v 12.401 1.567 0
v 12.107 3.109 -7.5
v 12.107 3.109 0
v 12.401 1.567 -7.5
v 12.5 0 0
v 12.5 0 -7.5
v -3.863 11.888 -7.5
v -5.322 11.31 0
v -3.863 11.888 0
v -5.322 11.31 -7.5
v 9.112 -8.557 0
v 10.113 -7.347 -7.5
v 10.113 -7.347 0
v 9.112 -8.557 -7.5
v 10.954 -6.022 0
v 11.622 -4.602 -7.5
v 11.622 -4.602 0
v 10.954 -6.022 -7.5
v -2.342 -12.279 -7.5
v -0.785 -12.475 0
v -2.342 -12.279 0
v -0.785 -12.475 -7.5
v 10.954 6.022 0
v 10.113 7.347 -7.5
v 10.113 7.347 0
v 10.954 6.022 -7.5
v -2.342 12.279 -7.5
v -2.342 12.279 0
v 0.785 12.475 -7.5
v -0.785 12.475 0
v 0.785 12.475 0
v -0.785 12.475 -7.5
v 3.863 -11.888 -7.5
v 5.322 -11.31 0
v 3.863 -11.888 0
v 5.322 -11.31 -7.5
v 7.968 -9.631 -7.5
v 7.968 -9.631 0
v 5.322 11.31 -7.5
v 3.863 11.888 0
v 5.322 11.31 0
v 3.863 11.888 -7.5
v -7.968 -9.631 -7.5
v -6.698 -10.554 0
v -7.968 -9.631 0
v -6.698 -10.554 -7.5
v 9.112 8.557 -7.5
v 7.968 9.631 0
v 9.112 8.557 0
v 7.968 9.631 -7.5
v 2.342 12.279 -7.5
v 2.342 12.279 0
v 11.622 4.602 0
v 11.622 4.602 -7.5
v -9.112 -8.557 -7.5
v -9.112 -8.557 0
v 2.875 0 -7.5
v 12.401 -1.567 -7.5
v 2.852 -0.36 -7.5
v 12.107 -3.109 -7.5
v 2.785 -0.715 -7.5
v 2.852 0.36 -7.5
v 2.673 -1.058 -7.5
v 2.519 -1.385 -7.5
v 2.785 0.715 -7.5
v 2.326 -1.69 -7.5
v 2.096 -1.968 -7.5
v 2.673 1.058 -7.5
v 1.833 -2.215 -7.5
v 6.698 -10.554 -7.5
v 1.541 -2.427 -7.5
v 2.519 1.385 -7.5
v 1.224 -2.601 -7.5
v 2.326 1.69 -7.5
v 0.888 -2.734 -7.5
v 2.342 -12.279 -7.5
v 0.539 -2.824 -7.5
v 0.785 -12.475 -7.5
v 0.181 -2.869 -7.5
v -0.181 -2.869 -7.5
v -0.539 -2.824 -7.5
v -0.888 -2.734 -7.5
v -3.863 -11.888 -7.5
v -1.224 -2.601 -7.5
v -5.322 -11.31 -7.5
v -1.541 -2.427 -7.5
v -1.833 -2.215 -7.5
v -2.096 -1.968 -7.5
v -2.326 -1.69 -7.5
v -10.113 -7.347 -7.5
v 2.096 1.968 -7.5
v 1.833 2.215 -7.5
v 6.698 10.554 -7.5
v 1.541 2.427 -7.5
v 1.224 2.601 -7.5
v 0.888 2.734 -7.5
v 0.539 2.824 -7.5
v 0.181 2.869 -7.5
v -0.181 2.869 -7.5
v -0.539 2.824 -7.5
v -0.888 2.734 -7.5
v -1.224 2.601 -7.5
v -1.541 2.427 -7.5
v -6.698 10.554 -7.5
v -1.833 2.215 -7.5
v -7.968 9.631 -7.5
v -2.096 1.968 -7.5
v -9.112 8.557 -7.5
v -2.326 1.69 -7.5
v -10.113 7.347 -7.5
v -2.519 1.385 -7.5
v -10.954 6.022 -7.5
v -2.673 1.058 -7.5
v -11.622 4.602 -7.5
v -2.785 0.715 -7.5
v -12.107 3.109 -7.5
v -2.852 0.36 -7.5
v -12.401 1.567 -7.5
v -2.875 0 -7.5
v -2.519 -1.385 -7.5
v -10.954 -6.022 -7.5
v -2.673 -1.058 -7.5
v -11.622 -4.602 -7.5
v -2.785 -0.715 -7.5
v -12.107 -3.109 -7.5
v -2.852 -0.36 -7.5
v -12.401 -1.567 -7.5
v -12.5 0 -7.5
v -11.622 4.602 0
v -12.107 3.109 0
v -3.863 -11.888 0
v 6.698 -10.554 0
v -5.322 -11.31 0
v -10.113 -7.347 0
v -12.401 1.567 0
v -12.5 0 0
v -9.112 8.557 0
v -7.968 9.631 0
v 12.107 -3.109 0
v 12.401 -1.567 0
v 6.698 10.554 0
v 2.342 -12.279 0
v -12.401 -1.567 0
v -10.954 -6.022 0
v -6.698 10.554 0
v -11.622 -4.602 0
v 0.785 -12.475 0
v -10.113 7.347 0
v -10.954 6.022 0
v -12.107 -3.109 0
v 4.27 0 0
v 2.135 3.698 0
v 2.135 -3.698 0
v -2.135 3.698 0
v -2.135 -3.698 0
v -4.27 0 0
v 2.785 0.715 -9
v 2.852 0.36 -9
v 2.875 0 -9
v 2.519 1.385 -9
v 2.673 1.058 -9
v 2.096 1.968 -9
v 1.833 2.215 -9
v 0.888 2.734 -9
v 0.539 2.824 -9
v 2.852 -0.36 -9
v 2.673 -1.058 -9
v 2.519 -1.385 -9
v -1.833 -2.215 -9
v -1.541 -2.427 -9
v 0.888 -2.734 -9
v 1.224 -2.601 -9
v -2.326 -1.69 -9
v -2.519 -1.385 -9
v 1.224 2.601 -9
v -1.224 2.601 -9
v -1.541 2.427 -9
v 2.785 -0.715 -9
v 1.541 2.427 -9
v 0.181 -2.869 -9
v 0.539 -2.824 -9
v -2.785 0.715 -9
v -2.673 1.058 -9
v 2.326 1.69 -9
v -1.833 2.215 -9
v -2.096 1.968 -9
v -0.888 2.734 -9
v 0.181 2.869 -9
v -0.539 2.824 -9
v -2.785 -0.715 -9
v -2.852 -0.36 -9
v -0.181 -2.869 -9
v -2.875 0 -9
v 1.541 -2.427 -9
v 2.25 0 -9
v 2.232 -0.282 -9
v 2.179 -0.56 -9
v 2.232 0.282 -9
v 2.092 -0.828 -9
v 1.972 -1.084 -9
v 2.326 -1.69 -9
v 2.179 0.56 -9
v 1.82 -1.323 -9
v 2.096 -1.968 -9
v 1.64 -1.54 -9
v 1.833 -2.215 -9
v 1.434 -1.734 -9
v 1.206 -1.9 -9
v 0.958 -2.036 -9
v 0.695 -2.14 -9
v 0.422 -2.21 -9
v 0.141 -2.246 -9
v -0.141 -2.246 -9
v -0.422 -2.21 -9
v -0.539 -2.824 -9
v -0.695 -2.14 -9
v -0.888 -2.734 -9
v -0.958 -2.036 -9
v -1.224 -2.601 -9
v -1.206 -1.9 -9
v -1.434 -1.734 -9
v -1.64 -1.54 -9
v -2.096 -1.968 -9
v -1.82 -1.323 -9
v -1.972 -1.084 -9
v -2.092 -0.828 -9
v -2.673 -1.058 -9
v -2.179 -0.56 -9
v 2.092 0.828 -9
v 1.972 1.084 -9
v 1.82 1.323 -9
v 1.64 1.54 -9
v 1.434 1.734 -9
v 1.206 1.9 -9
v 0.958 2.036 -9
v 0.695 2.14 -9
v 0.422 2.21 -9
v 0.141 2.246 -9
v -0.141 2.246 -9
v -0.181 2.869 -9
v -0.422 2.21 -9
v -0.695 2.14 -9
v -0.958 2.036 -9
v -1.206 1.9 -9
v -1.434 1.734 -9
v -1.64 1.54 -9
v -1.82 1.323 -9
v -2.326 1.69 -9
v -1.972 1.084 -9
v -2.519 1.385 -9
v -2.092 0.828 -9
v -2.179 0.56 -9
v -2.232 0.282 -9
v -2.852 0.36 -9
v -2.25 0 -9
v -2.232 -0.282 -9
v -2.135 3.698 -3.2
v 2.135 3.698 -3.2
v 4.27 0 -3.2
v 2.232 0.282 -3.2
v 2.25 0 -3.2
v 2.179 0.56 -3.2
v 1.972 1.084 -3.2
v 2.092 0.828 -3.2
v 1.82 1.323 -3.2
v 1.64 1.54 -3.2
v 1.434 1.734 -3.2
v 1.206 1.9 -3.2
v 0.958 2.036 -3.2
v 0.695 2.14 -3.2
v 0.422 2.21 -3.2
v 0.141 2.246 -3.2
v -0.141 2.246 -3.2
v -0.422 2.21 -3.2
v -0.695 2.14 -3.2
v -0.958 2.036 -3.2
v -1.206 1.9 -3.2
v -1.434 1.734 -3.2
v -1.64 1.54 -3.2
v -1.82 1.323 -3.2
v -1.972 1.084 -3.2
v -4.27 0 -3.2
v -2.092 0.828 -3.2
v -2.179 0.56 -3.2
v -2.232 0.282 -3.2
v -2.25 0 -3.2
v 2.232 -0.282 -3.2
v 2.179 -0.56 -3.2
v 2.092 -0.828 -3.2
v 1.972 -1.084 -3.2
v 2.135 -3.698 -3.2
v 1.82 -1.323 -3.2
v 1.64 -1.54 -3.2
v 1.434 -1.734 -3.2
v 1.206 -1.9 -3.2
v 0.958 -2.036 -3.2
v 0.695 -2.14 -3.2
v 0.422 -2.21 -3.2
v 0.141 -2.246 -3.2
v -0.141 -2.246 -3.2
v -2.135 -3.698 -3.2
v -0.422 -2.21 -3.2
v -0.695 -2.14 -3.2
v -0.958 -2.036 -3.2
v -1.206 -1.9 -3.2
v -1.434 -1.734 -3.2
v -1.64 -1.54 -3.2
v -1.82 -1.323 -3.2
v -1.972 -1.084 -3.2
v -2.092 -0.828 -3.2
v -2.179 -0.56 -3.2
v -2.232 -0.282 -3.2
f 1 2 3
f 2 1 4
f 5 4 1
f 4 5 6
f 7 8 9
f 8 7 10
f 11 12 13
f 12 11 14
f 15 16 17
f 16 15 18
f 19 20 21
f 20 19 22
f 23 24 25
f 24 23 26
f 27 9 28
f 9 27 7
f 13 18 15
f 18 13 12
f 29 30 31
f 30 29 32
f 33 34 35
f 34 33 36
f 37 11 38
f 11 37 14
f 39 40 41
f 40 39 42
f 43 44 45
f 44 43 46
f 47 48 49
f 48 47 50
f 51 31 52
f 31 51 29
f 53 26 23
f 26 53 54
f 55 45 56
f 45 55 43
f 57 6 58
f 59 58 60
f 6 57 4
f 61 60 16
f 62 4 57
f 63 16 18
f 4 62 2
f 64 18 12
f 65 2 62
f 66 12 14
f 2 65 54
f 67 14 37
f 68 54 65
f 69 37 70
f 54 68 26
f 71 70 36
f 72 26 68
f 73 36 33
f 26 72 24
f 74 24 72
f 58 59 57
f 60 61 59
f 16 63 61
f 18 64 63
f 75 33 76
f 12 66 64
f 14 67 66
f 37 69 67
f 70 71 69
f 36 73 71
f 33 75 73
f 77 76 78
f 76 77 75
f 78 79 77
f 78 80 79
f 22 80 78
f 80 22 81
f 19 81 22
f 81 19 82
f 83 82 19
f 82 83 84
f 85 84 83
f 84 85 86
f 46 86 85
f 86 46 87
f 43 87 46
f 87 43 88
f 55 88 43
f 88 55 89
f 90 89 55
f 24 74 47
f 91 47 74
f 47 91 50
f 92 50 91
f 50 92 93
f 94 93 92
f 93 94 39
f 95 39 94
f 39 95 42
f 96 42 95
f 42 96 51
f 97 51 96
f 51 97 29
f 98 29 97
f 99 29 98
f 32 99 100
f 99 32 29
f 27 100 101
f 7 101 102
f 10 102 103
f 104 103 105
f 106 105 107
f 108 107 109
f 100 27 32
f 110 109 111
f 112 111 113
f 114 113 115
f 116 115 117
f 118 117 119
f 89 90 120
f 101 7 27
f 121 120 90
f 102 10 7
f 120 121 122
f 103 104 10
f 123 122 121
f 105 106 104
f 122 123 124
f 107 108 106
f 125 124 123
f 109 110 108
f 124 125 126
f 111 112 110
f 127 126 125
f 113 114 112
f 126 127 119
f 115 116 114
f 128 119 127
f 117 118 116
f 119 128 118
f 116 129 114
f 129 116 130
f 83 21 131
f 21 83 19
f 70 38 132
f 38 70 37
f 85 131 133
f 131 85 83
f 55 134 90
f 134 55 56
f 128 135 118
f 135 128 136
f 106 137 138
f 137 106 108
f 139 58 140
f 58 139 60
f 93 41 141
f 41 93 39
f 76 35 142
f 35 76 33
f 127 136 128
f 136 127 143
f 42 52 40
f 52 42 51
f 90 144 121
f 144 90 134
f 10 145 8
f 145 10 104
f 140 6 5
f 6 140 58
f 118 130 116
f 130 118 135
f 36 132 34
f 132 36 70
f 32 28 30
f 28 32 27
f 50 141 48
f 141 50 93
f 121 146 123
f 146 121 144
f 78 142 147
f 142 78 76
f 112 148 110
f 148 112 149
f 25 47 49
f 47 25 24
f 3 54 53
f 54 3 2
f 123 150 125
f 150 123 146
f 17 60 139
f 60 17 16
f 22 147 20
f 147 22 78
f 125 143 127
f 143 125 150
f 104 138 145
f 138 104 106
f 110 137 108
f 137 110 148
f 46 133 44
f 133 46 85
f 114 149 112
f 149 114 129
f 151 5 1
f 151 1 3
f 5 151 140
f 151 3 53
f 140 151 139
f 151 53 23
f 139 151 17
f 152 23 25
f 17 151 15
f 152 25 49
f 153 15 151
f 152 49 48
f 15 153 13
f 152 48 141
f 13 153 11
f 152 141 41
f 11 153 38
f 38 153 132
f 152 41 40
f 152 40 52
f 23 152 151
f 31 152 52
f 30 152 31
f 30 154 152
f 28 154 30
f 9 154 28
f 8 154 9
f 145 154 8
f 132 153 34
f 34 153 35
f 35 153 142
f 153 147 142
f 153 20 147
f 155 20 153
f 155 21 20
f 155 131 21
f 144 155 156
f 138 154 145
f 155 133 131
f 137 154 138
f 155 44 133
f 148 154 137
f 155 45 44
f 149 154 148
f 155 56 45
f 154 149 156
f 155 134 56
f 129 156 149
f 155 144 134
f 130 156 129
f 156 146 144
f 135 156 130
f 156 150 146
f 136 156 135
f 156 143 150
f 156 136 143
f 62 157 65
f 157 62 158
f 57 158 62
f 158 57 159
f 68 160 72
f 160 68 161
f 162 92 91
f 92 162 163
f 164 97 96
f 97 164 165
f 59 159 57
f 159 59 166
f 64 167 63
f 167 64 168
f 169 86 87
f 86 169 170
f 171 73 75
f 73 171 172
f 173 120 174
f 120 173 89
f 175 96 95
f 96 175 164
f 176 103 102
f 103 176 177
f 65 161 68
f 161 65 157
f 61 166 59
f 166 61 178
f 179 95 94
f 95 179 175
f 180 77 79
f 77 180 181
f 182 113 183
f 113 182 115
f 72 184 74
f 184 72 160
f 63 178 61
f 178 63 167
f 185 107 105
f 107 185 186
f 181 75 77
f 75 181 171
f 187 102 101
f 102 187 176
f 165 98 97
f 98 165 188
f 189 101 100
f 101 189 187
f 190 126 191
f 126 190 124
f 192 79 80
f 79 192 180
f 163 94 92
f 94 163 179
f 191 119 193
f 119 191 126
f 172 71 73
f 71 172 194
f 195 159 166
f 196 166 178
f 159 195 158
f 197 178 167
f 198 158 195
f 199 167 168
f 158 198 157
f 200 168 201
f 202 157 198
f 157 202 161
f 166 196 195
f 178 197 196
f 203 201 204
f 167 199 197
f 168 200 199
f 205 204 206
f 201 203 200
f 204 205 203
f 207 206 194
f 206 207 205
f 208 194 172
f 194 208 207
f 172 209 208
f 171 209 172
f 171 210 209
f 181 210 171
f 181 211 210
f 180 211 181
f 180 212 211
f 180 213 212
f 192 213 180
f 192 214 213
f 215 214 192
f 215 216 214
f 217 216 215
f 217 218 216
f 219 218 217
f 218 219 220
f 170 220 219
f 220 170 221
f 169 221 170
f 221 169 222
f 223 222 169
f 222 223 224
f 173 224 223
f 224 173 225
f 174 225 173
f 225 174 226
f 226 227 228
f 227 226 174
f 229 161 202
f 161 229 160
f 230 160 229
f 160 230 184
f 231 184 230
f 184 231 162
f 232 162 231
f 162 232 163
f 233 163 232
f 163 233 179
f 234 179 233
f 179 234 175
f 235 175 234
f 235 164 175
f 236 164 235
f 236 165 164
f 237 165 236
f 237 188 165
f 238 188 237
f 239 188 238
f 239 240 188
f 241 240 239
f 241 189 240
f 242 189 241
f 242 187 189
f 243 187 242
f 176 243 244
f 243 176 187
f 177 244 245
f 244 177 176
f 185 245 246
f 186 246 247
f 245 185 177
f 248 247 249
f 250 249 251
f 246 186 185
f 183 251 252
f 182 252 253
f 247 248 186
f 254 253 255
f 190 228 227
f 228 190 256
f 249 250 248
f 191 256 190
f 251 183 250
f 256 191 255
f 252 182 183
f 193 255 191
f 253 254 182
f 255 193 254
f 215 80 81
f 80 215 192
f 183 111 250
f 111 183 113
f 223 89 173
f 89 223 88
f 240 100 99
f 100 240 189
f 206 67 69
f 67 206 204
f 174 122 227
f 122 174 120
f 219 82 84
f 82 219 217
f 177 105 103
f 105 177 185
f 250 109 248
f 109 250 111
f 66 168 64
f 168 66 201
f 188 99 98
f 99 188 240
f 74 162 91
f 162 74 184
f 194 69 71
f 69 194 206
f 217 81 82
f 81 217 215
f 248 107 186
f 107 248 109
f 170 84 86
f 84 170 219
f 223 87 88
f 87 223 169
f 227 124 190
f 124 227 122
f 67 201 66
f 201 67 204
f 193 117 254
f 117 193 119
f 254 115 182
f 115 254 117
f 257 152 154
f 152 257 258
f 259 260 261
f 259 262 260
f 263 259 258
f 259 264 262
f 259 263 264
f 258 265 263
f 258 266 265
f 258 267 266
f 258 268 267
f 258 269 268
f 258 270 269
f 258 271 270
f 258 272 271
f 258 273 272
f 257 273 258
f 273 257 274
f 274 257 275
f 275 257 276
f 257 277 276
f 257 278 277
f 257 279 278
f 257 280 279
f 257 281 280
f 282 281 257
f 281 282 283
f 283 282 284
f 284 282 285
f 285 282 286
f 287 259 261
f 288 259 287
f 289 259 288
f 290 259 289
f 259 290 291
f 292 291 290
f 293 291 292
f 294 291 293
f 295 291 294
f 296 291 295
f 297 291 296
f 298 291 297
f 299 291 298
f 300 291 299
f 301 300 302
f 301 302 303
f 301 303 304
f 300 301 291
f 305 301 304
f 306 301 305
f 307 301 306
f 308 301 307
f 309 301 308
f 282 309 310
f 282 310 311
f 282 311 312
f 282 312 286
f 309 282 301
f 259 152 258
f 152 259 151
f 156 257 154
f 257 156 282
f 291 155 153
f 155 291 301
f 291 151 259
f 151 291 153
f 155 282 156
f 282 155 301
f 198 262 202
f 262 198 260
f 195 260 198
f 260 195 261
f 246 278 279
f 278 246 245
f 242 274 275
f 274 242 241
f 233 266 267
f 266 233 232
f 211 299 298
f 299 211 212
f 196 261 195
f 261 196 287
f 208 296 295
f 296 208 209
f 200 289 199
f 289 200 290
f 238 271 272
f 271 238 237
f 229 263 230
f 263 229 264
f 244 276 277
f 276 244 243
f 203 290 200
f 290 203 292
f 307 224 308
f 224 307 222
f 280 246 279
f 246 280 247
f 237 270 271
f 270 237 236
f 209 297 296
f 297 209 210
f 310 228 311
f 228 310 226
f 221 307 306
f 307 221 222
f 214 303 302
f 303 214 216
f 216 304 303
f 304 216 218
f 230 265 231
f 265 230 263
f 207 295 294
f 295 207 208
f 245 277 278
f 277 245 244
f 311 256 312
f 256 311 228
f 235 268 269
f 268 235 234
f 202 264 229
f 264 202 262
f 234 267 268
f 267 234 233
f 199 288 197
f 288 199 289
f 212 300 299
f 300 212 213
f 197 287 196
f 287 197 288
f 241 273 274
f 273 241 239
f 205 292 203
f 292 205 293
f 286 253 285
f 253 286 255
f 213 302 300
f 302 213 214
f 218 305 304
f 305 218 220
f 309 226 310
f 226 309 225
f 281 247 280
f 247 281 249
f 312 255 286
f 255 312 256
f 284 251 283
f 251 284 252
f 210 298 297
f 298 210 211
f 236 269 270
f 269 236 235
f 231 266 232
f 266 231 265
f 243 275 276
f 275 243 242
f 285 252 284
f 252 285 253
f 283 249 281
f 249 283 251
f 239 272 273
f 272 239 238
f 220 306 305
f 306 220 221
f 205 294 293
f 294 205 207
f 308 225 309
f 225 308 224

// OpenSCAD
$fn = 50;

difference() {
	union() {
		translate(v = [0, 0, -7.5]) {
			cylinder(h = 7.5, r = 12.5);
		}
		#translate(v = [0, 0, -9.0]) {
			cylinder(h = 9, r = 2.875);
		}
	}
	union() {
		translate(v = [0, 0, 0]) {
			rotate(a = [0, 0, 0]) {
				difference() {
					union() {
						translate(v = [0, 0, -3.2]) {
							linear_extrude(height = 3.2) {
								polygon(points = [[4.2698, 0.0], [2.1349000000000005, 3.697755269078796], [-2.134899999999999, 3.6977552690787965], [-4.2698, 5.228996902999369e-16], [-2.134900000000002, -3.6977552690787956], [2.1348999999999974, -3.697755269078798]]);
							}
						}
					}
					union();
				}
			}
		}
		#translate(v = [0, 0, -100.0]) {
			cylinder(h = 200, r = 2.25);
		}
	}
}
